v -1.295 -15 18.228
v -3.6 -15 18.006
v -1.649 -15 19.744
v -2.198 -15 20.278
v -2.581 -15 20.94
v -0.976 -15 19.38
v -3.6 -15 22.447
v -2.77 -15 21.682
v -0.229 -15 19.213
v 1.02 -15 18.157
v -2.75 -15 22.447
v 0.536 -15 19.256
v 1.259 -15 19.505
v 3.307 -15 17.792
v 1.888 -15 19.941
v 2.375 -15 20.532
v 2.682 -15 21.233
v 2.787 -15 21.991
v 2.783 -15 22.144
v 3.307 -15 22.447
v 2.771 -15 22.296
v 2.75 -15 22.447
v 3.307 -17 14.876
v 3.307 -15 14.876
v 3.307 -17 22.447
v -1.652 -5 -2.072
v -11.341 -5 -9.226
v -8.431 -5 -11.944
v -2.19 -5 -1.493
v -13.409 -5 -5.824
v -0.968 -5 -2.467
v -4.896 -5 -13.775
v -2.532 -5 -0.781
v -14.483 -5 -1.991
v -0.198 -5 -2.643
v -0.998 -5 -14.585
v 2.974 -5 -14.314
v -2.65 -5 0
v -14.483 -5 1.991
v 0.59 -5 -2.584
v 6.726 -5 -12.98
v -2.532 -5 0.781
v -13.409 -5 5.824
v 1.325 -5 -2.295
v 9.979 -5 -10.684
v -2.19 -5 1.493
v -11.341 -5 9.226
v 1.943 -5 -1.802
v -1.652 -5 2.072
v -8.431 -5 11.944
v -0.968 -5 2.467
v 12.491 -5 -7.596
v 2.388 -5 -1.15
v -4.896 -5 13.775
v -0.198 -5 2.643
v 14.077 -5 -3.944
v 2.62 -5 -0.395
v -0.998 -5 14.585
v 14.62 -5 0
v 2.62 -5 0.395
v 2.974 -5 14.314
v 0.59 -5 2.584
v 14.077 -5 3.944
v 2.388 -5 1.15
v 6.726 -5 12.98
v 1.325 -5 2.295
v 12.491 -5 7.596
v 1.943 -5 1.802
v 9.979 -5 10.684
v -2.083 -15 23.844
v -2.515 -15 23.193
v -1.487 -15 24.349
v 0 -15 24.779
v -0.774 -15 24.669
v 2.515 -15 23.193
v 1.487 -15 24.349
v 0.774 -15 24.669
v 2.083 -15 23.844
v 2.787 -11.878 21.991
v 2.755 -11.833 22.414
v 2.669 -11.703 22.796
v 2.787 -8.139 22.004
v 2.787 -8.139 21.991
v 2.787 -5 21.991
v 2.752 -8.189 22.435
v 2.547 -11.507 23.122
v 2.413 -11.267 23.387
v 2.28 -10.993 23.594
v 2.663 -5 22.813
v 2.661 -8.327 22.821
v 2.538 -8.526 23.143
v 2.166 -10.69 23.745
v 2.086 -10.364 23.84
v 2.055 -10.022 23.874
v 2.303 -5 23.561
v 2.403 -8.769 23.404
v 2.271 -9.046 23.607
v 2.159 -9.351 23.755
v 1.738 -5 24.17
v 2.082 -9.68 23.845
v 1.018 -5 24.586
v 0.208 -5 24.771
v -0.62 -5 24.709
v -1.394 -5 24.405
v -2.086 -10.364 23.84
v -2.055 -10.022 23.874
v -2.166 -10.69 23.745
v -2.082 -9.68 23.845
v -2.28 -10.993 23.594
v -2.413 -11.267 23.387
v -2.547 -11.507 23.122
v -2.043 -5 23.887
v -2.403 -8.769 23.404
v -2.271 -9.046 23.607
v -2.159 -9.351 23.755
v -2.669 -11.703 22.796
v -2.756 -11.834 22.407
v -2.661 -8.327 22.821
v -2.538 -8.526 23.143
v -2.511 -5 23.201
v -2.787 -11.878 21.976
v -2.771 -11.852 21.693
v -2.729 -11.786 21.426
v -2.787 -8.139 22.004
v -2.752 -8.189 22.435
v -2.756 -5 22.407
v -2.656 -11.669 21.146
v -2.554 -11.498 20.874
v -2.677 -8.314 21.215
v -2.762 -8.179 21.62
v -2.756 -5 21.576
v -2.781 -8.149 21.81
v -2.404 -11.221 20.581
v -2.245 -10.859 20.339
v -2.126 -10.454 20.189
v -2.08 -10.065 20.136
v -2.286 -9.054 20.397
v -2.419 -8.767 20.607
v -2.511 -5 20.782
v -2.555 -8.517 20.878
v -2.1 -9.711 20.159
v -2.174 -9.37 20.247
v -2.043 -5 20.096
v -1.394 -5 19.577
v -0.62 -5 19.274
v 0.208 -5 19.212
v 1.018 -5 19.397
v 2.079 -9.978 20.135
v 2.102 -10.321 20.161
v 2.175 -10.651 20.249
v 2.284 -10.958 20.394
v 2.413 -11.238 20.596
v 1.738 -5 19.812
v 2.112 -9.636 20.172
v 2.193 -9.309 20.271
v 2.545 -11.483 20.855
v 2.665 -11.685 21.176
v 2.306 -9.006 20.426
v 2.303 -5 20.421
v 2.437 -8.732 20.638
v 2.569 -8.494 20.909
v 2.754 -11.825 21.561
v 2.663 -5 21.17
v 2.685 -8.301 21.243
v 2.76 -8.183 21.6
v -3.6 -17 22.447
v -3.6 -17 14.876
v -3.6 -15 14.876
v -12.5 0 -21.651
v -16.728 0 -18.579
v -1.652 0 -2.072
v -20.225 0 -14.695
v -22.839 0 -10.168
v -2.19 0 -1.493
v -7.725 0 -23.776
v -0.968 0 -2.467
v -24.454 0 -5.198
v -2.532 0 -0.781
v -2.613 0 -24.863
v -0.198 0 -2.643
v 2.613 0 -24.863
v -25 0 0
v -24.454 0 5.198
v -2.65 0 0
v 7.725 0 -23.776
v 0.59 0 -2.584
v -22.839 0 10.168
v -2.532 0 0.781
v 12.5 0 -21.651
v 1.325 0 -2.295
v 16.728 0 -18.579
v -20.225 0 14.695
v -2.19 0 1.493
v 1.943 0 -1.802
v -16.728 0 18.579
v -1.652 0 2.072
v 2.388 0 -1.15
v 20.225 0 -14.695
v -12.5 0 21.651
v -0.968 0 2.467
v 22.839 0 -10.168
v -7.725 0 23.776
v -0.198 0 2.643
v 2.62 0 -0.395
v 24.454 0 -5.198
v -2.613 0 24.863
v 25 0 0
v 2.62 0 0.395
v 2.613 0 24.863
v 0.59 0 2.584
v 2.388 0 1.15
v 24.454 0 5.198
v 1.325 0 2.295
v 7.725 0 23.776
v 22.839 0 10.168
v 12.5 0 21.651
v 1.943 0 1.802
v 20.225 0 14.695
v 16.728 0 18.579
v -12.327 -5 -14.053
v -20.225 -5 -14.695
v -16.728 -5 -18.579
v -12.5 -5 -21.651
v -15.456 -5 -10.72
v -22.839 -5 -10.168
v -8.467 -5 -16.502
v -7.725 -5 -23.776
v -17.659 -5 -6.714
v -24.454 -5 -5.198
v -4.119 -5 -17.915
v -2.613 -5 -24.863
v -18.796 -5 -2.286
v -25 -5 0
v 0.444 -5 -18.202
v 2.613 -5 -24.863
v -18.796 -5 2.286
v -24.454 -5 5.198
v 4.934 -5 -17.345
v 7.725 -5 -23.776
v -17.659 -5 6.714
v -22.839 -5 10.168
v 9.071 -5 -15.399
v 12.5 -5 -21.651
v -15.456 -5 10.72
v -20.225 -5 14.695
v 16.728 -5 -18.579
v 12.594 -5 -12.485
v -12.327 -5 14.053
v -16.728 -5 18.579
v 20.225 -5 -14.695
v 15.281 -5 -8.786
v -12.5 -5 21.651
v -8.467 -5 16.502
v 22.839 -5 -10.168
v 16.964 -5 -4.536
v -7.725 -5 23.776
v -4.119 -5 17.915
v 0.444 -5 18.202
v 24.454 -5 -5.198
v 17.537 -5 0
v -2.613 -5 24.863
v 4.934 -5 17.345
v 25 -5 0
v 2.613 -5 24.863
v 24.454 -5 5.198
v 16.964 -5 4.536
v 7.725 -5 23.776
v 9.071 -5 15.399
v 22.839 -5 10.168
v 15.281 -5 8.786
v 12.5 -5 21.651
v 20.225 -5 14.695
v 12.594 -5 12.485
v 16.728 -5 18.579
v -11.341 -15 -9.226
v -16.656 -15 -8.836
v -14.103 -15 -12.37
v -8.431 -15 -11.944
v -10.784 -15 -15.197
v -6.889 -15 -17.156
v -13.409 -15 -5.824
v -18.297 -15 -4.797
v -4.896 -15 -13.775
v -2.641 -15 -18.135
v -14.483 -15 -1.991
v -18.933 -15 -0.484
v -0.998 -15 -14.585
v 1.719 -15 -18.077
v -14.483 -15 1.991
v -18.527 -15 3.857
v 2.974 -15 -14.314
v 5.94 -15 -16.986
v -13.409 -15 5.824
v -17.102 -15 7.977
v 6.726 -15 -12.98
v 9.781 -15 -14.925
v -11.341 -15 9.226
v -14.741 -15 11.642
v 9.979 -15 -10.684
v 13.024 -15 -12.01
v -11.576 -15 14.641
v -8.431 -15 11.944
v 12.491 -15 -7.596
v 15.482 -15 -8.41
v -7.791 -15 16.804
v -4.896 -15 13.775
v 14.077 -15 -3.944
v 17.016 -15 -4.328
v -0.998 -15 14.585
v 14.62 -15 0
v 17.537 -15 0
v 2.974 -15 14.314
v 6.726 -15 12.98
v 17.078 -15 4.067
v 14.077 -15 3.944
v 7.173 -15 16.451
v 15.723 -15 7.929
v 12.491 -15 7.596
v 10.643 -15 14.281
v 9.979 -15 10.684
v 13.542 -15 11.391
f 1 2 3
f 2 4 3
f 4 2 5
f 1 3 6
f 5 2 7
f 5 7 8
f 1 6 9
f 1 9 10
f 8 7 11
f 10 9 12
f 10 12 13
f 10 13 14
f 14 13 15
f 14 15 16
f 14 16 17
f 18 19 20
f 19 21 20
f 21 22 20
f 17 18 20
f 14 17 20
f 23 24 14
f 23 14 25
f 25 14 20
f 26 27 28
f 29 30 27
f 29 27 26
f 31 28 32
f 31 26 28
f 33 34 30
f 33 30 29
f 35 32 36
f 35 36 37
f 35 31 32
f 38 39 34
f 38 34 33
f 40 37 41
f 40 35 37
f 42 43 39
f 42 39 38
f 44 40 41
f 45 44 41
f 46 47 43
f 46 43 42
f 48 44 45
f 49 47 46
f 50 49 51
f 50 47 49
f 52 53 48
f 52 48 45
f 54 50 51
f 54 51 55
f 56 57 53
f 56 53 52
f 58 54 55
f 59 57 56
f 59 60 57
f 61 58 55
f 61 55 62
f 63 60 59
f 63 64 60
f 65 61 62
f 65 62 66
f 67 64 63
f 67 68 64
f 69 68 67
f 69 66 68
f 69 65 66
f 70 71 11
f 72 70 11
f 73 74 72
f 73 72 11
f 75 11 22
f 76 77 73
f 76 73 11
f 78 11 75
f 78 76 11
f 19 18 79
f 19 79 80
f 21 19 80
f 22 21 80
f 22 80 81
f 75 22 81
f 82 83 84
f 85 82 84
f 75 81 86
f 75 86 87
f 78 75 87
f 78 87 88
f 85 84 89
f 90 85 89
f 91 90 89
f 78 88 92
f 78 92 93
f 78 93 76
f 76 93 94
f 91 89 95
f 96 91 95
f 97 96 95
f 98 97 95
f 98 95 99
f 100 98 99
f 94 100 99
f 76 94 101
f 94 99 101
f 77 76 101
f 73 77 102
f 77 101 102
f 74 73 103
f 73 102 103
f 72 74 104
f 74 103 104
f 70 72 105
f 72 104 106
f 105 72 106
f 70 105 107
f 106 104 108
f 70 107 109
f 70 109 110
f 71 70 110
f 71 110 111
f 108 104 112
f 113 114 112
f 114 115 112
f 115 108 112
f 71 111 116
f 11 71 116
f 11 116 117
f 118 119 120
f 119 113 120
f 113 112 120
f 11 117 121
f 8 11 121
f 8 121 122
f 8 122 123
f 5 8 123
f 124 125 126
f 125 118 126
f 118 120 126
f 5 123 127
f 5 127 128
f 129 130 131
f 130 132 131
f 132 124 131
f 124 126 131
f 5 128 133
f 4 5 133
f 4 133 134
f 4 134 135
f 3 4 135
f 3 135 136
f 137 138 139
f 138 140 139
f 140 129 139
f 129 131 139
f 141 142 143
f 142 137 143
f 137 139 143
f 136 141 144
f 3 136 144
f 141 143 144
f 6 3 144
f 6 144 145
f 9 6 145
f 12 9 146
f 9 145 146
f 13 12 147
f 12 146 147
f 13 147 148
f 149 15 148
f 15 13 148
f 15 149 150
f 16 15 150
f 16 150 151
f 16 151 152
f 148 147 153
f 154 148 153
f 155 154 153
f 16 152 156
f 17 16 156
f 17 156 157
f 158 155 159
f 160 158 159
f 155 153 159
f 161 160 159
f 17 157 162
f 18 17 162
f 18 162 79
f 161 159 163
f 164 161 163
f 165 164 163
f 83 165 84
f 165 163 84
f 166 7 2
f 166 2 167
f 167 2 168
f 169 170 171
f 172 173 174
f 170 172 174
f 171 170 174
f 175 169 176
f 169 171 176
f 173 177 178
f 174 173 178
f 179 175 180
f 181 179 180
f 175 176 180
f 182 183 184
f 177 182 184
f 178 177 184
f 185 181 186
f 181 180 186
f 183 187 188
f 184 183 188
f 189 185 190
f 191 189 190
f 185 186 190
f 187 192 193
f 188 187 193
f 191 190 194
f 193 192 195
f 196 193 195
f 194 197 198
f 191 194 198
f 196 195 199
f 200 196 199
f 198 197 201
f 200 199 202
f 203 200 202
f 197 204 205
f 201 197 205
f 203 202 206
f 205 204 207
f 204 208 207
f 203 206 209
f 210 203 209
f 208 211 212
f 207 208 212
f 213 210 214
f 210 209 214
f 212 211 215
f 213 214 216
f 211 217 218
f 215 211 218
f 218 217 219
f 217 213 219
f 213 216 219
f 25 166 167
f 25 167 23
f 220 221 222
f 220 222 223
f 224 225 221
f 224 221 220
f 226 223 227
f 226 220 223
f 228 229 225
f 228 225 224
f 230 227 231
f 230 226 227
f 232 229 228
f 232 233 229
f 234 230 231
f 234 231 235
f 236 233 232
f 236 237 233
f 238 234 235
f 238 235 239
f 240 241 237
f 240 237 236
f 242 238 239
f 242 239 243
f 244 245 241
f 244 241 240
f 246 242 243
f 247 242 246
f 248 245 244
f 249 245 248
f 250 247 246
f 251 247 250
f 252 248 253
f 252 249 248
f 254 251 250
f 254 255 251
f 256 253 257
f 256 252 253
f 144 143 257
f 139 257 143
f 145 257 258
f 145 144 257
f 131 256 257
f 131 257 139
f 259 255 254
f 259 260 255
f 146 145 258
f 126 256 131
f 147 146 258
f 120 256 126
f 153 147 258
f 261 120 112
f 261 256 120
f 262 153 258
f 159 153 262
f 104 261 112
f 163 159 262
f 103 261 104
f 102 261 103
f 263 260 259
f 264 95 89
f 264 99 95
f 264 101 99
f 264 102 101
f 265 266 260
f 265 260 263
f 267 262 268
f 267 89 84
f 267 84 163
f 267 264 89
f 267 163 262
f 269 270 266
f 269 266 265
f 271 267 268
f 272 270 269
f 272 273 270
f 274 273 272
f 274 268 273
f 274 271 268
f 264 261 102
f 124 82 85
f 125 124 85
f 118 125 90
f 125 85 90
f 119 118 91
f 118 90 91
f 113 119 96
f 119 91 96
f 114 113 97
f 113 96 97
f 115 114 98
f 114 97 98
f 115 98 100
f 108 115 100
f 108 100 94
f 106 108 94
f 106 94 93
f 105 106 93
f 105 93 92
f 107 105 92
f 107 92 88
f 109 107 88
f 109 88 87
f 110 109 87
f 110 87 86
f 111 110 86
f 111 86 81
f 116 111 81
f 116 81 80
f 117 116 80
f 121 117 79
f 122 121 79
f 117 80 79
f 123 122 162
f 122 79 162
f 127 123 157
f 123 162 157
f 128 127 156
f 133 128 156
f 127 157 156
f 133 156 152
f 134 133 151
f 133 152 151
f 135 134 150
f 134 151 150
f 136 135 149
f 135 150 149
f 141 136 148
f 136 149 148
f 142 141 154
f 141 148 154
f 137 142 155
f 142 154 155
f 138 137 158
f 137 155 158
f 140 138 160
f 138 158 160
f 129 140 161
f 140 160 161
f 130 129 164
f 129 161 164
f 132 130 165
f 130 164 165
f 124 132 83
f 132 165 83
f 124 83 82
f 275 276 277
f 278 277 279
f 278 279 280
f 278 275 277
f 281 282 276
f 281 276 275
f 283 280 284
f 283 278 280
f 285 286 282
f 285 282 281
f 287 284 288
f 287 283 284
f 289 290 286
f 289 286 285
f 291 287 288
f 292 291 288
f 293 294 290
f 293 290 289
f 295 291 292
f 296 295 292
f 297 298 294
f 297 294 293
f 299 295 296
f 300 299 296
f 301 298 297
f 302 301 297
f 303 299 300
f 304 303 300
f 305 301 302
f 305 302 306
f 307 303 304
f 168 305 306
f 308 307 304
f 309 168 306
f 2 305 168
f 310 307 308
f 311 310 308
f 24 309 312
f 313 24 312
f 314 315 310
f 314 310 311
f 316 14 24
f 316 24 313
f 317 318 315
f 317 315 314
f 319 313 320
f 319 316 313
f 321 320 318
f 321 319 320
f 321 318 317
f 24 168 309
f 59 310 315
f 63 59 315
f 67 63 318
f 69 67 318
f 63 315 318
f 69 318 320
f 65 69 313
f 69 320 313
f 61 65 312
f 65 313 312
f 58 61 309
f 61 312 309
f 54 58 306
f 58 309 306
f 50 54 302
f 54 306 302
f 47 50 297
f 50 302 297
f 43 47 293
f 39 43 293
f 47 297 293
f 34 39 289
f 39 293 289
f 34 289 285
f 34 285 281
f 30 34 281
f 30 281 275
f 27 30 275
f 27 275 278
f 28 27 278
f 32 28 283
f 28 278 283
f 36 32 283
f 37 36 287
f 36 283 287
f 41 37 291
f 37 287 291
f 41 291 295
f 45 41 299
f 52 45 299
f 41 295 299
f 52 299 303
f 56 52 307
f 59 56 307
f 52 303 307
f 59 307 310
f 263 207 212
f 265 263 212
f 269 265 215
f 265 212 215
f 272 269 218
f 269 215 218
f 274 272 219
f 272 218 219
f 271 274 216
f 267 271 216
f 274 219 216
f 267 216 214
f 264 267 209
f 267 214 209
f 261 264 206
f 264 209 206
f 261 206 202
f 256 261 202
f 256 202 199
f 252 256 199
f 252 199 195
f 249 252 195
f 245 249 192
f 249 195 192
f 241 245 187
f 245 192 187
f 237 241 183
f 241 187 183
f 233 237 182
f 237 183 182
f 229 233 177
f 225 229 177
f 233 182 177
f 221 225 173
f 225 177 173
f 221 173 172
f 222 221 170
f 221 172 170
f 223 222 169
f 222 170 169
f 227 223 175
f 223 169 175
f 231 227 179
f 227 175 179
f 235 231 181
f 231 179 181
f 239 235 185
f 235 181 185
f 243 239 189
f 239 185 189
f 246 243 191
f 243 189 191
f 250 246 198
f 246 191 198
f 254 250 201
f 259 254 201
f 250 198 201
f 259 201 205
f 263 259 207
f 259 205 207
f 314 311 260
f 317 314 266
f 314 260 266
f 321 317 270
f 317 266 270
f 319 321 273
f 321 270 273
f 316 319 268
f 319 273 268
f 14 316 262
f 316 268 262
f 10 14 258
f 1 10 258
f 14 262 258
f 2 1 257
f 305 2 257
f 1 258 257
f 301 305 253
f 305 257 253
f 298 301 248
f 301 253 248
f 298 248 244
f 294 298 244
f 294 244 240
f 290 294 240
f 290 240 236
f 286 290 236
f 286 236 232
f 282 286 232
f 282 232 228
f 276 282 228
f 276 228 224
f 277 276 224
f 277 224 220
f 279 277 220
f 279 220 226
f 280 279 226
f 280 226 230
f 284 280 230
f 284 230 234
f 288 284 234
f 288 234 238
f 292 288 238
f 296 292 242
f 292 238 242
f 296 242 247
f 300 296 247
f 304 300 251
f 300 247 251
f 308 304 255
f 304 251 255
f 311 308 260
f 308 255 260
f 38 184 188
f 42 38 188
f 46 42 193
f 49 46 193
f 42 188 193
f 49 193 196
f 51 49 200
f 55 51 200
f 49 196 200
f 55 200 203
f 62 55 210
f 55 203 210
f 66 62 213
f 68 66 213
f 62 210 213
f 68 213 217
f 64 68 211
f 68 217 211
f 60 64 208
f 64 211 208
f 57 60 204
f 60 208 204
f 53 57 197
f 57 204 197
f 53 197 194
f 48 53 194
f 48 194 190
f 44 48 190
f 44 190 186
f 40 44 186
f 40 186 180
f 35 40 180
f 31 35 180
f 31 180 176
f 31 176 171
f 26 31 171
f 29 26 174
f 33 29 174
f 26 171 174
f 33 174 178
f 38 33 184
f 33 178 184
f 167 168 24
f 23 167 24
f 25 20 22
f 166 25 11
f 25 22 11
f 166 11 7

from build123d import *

# Parameters (mm, degrees)
F0_R      = 25
F1_DEPTH  = 5
F2_R      = 2.65
F3_DEPTH  = 5
F5_R      = 18.238073
F6_DEPTH  = 10
F7_R      = 14.619557
F8_DEPTH  = 10
F9_R      = 2.787227
F10_DEPTH = 10
F12_DEPTH = 2
F13_R     = 1.869592
F14_DEPTH = 25.4


with BuildPart() as f1:
    # F0 (on Front) → F1 (new body)
    with BuildSketch(Plane.XZ):
        Circle(F0_R)
    extrude(amount=F1_DEPTH)

    # F2 (on face) → F3 (cut)
    with BuildSketch(Plane(origin=(0, 0, 0), x_dir=(-1, 0, 0), z_dir=(0, 1, 0))):
        Circle(F2_R)
    extrude(amount=-F3_DEPTH, mode=Mode.SUBTRACT)

    # F5 (on face) → F6 (join)
    with BuildSketch(Plane.XZ.offset(5)):
        with Locations((-0.701384, 0)):
            Circle(F5_R)
    extrude(amount=F6_DEPTH)

    # F7 (on face) → F8 (cut)
    with BuildSketch(Plane.XZ.offset(15)):
        Circle(F7_R)
    extrude(amount=-F8_DEPTH, mode=Mode.SUBTRACT)

    # F9 (on face) → F10 (join)
    with BuildSketch(Plane.XZ.offset(5)):
        with Locations((0, 21.991307)):
            Circle(F9_R)
    extrude(amount=F10_DEPTH)

    # F11 (on face) → F12 (join)
    with BuildSketch(Plane.XZ.offset(15)):
        with BuildLine():
            Line((-2.749703, 22.447126), (-3.600255, 22.447126))
            Line((-3.600255, 22.447126), (-3.600255, 14.876149))
            Line((-3.600255, 14.876149), (3.30658, 14.876149))
            Line((3.30658, 14.876149), (3.30658, 22.447126))
            Line((3.30658, 22.447126), (2.749703, 22.447126))
            ThreePointArc((2.749703, 22.447126), (2.77783, 22.219987), (2.787227, 21.991307))
            ThreePointArc((2.787227, 21.991307), (-0.228681, 19.213476), (-2.749703, 22.447126))
        make_face()
        with BuildLine():
            Line((2.749703, 22.447126), (-2.749703, 22.447126))
            ThreePointArc((-2.749703, 22.447126), (-0.228681, 19.213476), (2.787227, 21.991307))
            ThreePointArc((2.787227, 21.991307), (2.77783, 22.219987), (2.749703, 22.447126))
        make_face()
    extrude(amount=F12_DEPTH)

    # F13 (on face) → F14 (cut)
    with BuildSketch(Plane.YZ.offset(3.30658)):
        with Locations((-10.008663, 22.004483)):
            Circle(F13_R)
    extrude(amount=-F14_DEPTH, mode=Mode.SUBTRACT)


solid = f1.part
